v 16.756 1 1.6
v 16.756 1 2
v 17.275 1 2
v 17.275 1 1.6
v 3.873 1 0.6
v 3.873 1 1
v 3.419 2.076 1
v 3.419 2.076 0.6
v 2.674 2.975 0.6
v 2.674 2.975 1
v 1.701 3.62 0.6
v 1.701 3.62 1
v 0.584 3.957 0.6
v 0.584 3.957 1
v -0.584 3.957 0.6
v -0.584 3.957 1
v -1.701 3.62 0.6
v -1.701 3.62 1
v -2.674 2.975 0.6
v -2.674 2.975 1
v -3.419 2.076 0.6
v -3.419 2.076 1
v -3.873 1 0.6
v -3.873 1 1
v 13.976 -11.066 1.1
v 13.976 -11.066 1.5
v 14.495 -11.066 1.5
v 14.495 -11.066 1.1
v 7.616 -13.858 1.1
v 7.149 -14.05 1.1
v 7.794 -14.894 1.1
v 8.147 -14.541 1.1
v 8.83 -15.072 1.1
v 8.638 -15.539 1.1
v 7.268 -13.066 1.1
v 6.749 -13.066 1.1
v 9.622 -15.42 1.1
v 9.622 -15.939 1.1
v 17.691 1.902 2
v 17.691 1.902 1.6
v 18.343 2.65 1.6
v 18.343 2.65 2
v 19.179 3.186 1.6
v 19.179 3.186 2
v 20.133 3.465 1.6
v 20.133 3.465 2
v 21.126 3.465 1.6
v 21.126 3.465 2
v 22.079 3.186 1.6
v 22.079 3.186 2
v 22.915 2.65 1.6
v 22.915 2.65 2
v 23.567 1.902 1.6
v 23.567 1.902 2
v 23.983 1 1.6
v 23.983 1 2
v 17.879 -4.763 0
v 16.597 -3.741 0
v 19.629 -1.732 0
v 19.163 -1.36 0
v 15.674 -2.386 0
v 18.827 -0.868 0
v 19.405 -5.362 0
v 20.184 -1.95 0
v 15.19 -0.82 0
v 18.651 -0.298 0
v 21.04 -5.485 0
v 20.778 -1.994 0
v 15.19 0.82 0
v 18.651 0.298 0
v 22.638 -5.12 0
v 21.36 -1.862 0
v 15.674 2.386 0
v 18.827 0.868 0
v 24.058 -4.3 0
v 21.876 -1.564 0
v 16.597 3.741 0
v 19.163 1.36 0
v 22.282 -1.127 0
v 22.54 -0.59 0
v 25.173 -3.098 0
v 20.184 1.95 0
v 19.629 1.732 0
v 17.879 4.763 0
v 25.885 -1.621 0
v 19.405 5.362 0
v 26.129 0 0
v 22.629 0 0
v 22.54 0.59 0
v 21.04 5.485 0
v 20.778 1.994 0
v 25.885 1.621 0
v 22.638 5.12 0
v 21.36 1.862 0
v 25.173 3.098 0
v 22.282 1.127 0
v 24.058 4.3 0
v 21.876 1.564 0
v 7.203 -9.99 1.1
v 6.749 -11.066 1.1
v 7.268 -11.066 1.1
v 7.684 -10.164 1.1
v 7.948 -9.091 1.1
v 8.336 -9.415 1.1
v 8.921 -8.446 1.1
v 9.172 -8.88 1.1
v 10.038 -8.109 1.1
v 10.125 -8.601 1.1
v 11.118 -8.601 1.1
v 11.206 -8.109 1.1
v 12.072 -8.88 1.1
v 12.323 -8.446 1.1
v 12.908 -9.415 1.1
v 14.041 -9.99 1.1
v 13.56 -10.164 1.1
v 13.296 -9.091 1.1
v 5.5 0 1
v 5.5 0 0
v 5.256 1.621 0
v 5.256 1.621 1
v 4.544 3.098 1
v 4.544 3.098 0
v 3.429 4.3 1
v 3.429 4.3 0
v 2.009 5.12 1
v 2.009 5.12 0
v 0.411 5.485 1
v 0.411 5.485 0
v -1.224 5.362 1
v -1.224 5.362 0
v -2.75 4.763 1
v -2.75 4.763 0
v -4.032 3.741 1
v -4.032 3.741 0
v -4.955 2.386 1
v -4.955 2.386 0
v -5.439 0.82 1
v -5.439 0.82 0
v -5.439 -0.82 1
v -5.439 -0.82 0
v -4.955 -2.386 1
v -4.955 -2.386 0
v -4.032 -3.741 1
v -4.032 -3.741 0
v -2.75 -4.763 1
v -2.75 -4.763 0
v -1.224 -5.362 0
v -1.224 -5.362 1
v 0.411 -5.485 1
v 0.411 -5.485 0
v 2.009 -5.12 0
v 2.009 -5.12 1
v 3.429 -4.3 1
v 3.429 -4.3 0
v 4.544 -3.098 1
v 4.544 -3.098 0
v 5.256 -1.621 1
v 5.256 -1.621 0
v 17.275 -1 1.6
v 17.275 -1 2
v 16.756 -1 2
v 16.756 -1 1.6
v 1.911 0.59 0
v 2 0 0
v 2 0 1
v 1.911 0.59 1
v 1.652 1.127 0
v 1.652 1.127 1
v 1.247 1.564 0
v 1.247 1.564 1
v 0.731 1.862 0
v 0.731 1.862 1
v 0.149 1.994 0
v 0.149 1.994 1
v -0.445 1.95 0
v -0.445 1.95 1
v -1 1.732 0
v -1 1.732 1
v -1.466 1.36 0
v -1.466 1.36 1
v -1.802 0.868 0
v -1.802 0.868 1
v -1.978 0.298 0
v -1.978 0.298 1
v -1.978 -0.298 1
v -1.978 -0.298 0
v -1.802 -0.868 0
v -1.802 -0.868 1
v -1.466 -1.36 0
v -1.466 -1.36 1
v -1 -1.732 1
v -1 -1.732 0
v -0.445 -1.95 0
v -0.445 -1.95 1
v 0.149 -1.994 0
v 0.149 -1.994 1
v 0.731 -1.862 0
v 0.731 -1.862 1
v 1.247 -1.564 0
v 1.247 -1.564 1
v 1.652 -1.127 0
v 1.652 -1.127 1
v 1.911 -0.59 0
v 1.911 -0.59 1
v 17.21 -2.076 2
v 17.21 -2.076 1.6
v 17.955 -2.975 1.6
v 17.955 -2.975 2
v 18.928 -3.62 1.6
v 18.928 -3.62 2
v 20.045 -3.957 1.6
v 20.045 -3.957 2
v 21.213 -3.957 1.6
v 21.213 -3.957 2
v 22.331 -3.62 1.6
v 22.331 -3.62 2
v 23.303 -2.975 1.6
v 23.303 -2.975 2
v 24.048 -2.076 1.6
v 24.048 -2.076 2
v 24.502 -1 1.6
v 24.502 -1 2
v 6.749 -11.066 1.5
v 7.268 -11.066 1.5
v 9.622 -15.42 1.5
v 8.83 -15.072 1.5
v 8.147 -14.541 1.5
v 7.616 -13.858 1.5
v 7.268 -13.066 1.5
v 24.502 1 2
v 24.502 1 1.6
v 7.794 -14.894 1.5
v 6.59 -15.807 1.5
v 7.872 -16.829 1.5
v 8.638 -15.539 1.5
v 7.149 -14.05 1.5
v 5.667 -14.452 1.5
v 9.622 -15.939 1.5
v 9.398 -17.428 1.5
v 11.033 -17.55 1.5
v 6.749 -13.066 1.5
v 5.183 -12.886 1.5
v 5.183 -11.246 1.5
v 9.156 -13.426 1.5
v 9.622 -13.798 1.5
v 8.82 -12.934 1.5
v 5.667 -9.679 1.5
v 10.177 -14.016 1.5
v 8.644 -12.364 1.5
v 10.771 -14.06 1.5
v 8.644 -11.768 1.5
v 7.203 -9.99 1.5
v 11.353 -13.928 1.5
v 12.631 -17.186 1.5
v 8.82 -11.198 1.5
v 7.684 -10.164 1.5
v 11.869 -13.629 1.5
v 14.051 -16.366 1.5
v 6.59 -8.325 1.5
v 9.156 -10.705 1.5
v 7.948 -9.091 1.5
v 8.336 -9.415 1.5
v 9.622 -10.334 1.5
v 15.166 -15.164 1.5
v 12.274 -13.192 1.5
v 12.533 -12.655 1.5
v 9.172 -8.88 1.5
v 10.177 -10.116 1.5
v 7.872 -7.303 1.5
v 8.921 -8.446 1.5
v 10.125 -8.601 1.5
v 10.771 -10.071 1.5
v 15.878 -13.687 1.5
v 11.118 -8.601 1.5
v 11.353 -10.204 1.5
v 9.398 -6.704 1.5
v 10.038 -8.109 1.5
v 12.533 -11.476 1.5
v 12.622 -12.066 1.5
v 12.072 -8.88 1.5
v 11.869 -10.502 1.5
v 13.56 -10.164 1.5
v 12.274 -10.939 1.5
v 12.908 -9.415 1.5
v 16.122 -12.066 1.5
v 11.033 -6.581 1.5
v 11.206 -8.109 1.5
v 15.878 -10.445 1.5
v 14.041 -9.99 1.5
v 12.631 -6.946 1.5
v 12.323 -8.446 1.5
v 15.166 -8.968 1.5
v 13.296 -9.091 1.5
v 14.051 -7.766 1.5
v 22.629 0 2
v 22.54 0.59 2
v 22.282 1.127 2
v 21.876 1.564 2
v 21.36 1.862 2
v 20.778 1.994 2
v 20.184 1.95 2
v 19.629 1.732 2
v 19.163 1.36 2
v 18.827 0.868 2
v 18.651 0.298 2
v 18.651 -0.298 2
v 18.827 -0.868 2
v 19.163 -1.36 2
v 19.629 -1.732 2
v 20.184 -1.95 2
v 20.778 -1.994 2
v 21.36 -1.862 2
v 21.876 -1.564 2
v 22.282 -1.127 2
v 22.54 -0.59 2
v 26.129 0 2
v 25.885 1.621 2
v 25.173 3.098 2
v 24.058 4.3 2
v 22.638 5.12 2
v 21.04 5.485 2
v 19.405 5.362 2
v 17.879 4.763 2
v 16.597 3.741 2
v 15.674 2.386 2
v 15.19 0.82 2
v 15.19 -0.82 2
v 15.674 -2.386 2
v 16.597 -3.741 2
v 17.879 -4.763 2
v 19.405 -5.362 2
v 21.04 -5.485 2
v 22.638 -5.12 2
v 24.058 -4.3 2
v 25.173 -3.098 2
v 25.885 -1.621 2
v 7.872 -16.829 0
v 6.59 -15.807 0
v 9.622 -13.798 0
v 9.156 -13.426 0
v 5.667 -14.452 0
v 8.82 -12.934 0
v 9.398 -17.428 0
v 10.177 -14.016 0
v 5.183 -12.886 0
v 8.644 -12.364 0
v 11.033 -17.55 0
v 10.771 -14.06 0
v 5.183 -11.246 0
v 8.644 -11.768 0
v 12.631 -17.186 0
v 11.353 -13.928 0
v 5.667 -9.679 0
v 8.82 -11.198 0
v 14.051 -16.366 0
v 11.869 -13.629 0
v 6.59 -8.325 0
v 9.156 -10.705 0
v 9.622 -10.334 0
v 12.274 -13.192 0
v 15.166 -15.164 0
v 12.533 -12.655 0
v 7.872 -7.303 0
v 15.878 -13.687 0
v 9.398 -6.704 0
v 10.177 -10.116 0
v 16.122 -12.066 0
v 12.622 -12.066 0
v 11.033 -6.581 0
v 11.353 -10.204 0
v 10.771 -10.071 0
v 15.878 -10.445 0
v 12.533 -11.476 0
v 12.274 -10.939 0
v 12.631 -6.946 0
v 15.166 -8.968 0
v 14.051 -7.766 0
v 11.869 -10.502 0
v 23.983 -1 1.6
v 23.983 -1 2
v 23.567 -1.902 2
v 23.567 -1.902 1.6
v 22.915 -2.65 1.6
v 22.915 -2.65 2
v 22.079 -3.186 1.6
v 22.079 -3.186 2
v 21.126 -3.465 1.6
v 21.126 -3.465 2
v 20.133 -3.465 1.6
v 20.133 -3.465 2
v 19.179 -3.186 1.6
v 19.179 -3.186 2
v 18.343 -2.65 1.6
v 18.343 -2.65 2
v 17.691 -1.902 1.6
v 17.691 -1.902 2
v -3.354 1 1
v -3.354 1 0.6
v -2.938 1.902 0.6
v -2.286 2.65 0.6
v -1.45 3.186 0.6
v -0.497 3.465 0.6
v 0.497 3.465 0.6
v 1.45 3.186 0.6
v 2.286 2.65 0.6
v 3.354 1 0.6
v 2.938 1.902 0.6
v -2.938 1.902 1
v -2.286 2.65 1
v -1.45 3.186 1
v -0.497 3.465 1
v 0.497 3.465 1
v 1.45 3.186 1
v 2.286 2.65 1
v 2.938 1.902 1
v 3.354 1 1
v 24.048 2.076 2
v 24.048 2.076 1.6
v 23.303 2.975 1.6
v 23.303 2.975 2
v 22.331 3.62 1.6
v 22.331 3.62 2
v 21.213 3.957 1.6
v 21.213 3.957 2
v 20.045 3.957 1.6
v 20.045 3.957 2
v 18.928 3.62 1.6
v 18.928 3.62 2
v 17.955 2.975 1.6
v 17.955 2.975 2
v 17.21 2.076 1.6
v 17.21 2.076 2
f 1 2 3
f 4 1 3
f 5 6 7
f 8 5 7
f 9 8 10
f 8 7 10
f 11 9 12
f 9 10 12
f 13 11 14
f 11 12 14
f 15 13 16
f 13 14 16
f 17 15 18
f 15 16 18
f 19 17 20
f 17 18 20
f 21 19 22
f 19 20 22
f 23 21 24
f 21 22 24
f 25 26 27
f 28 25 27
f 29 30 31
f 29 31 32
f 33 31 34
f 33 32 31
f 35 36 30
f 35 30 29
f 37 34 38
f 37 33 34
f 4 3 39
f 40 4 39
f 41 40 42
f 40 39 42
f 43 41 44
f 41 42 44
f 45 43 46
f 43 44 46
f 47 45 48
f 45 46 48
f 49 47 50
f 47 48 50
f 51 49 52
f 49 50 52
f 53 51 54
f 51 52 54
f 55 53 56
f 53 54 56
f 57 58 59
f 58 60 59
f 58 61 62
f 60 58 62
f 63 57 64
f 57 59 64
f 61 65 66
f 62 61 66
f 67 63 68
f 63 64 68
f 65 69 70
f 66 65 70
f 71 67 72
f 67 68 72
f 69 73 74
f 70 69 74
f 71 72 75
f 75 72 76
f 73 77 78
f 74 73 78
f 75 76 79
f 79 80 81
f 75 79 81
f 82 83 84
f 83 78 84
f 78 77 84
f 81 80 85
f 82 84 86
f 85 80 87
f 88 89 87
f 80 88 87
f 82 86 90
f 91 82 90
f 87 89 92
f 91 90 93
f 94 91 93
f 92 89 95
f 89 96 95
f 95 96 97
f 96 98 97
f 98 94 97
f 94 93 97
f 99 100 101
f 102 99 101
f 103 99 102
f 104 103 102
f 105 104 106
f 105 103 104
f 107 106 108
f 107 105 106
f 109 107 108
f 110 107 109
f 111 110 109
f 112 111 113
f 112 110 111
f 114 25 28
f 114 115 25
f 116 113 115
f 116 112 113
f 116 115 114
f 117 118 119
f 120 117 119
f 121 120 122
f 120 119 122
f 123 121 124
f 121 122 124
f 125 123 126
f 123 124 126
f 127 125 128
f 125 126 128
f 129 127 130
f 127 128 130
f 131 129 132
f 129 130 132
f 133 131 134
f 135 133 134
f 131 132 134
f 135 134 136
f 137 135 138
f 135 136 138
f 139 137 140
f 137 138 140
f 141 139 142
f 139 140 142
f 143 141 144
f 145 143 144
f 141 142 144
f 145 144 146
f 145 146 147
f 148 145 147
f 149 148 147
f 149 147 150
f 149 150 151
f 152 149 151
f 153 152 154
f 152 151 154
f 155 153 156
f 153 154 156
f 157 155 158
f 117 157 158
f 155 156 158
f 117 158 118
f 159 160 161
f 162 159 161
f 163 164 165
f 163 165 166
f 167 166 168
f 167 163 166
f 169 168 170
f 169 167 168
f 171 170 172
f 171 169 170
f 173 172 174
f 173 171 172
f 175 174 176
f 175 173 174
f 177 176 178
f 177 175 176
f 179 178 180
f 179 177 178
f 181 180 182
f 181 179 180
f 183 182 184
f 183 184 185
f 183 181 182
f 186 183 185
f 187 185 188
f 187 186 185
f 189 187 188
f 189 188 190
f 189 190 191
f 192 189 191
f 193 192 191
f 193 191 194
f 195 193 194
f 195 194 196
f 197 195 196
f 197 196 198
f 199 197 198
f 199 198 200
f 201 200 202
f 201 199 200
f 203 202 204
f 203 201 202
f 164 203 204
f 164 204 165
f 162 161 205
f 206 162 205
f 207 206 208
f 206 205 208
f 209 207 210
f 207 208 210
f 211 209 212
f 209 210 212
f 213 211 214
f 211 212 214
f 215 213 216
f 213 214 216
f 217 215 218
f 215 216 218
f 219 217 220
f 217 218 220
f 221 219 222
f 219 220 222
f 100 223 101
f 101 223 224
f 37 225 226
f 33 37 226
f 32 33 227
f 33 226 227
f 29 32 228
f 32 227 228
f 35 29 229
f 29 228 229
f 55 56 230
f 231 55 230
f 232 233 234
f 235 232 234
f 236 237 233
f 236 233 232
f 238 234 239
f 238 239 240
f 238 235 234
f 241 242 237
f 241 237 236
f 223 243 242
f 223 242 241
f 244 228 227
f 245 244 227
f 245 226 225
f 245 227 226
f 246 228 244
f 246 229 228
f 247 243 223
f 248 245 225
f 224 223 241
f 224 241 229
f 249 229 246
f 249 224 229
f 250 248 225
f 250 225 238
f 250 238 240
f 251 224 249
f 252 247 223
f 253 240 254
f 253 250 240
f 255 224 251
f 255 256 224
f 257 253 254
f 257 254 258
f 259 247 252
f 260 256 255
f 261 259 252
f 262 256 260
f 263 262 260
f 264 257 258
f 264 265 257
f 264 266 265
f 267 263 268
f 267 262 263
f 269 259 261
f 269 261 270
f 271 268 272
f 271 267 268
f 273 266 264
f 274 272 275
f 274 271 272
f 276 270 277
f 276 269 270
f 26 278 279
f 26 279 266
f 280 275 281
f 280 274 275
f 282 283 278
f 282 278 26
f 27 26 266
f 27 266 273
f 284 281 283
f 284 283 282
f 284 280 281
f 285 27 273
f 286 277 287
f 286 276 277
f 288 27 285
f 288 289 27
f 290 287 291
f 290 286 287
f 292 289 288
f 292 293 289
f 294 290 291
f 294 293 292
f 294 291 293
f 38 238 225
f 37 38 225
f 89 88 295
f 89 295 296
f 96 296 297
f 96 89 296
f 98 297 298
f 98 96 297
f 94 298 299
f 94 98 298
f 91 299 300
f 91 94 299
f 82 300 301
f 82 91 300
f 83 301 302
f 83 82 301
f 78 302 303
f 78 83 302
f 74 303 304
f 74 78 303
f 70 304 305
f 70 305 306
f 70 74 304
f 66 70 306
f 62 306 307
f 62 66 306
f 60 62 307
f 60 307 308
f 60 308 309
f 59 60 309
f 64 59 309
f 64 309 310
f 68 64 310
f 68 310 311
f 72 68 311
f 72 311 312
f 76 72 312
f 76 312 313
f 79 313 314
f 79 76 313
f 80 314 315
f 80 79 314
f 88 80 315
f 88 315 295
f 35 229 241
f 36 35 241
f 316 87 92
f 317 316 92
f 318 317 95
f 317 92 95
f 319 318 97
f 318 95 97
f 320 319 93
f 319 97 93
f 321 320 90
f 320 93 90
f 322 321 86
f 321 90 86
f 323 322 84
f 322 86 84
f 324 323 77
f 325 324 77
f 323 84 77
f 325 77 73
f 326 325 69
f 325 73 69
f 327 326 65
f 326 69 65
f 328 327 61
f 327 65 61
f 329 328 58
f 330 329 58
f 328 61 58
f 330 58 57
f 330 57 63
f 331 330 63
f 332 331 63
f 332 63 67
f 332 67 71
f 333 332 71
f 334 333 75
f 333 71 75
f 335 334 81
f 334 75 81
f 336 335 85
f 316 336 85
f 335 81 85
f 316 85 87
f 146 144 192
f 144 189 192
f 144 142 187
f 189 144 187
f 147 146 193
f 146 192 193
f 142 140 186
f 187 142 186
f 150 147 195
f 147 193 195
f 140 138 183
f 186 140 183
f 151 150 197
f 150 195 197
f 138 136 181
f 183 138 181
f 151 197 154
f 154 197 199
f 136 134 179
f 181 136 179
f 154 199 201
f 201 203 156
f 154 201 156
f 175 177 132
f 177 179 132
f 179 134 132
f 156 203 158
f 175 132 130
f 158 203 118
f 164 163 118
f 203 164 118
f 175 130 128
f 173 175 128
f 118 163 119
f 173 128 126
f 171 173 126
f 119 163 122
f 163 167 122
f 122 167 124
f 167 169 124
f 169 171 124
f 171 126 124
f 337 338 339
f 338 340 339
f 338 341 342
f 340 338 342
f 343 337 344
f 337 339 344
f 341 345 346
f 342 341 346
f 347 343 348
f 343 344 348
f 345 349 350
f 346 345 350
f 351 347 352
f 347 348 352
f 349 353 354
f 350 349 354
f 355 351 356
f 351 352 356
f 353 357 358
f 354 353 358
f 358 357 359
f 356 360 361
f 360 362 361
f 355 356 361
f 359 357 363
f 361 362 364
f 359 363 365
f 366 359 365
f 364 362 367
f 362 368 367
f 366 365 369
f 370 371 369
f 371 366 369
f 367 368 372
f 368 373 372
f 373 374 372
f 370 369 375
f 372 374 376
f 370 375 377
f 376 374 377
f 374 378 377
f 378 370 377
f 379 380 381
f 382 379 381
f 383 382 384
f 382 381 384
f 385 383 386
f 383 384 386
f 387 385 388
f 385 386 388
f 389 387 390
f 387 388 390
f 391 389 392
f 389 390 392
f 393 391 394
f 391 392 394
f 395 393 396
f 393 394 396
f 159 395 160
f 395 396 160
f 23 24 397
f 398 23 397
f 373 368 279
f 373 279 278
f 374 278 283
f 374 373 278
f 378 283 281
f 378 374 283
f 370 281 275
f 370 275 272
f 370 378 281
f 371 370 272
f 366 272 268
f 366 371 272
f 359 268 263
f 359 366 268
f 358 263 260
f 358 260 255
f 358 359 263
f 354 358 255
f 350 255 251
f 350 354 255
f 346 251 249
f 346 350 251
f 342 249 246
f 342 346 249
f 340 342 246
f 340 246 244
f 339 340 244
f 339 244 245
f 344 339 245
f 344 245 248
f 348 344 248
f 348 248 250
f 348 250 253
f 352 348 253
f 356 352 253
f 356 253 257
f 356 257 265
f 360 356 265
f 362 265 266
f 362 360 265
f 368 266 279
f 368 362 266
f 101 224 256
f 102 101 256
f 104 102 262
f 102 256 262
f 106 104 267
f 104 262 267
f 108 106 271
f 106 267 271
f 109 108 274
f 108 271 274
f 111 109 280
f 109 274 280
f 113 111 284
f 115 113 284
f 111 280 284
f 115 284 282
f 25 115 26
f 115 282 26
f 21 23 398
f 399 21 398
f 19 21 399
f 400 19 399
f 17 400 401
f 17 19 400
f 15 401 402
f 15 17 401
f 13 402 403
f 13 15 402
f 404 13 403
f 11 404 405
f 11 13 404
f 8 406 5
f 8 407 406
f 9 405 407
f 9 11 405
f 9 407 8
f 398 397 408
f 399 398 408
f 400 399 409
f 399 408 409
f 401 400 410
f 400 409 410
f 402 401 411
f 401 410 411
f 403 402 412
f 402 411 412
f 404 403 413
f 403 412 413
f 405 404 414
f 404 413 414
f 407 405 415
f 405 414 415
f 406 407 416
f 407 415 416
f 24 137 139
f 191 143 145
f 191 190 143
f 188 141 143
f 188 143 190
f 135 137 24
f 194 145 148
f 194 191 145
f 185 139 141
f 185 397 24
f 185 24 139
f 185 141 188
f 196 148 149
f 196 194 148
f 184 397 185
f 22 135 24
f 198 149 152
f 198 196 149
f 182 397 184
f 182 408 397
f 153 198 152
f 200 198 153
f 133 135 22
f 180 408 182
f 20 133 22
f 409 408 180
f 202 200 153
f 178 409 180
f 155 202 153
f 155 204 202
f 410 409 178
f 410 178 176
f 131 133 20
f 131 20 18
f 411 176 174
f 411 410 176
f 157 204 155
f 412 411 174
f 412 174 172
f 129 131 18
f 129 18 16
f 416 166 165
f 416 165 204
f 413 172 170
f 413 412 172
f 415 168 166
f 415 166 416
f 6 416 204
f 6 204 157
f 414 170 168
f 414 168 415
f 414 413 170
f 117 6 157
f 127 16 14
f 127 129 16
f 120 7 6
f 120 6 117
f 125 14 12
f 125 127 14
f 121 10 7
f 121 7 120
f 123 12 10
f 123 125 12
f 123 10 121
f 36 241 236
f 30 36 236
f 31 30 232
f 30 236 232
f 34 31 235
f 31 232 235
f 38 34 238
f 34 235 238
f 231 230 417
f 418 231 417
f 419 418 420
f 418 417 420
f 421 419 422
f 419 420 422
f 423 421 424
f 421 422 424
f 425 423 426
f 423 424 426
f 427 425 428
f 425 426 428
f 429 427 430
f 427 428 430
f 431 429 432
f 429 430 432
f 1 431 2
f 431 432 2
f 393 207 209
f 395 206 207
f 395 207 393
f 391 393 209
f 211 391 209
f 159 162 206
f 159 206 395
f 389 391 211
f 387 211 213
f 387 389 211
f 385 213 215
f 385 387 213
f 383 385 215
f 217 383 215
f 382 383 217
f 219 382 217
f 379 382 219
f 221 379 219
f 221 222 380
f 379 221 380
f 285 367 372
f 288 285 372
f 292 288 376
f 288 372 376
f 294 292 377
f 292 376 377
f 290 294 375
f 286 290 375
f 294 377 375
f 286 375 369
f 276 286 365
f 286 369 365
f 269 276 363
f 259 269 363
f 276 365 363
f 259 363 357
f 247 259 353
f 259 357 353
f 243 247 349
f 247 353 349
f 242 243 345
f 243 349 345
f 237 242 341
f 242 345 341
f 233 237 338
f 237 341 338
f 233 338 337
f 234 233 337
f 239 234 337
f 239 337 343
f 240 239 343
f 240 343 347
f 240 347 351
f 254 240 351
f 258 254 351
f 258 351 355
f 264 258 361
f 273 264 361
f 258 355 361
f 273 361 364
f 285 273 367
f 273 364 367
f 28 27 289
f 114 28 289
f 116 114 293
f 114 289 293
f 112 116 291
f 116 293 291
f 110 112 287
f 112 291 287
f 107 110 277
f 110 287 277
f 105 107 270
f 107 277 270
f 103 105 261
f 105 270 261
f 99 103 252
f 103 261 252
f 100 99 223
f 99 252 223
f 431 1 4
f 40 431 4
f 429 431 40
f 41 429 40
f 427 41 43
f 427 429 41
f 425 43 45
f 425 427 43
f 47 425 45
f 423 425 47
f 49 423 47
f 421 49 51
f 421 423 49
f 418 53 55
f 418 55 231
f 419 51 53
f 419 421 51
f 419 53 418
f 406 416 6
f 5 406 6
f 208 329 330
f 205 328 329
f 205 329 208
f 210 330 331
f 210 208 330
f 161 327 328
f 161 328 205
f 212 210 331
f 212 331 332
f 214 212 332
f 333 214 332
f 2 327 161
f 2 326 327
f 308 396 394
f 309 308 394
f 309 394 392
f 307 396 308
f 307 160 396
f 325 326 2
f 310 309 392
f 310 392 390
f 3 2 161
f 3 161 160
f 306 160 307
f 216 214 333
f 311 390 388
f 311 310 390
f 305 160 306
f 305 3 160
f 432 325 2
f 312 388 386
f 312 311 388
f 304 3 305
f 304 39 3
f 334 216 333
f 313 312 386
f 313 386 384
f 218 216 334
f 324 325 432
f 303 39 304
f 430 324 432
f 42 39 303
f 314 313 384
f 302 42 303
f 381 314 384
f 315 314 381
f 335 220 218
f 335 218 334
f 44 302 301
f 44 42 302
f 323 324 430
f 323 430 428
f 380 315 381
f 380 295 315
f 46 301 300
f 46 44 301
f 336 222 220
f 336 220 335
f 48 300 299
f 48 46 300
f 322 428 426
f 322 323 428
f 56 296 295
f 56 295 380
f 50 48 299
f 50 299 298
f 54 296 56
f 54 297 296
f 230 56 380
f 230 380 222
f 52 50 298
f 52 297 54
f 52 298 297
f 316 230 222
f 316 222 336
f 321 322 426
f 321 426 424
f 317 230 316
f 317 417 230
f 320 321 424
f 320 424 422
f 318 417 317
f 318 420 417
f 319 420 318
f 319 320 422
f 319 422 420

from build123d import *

# Parameters (mm, degrees)
F0_R      = 5.5
F0_R_2    = 2
F1_DEPTH  = 1
F3_DEPTH  = 0.4
F4_R      = 5.5
F4_R_2    = 2
F5_DEPTH  = 2
F7_DEPTH  = 0.4
F8_R      = 5.5
F8_R_2    = 2
F9_DEPTH  = 1.5
F11_DEPTH = 0.4


with BuildPart() as f1:
    # F0 (on Top) → F1 (new body)
    with BuildSketch(Plane.XY):
        Circle(F0_R)
        Circle(F0_R_2, mode=Mode.SUBTRACT)
    extrude(amount=F1_DEPTH)

    # F2 (on face) → F3 (cut)
    with BuildSketch(Plane.XY.offset(1)):
        with BuildLine():
            Line((3.3541019662, 1), (3.8729833462, 1))
            ThreePointArc((3.8729833462, 1), (0, 4), (-3.8729833462, 1))
            Line((-3.8729833462, 1), (-3.3541019662, 1))
            ThreePointArc((-3.3541019662, 1), (0, 3.5), (3.3541019662, 1))
        make_face()
    extrude(amount=-F3_DEPTH, mode=Mode.SUBTRACT)


with BuildPart() as f5:
    # F4 (on Top) → F5 (new body)
    with BuildSketch(Plane.XY):
        with Locations((20.6290315837, 0)):
            Circle(F4_R)
        with Locations((20.6290315837, 0)):
            Circle(F4_R_2, mode=Mode.SUBTRACT)
    extrude(amount=F5_DEPTH)

    # F6 (on face) → F7 (cut)
    with BuildSketch(Plane.XY.offset(2)):
        with BuildLine():
            ThreePointArc((17.2749296174, 1), (20.6290315837, 3.5), (23.9831335499, 1))
            Line((23.9831335499, 1), (24.5020149299, 1))
            ThreePointArc((24.5020149299, 1), (20.6290315837, 4), (16.7560482375, 1))
            Line((16.7560482375, 1), (17.2749296174, 1))
        make_face()
        with BuildLine():
            Line((24.5020149299, -1), (23.9831335499, -1))
            ThreePointArc((23.9831335499, -1), (20.6290315837, -3.5), (17.2749296174, -1))
            Line((17.2749296174, -1), (16.7560482375, -1))
            ThreePointArc((16.7560482375, -1), (20.6290315837, -4), (24.5020149299, -1))
        make_face()
    extrude(amount=-F7_DEPTH, mode=Mode.SUBTRACT)


with BuildPart() as f9:
    # F8 (on Top) → F9 (new body)
    with BuildSketch(Plane.XY):
        with Locations((10.6219938025, -12.065812014)):
            Circle(F8_R)
        with Locations((10.6219938025, -12.065812014)):
            Circle(F8_R_2, mode=Mode.SUBTRACT)
    extrude(amount=F9_DEPTH)

    # F10 (on face) → F11 (cut)
    with BuildSketch(Plane.XY.offset(1.5)):
        with BuildLine():
            Line((13.9760957687, -11.065812014), (14.4949771487, -11.065812014))
            ThreePointArc((14.4949771487, -11.065812014), (10.6219938025, -8.065812014), (6.7490104563, -11.065812014))
            Line((6.7490104563, -11.065812014), (7.2678918362, -11.065812014))
            ThreePointArc((7.2678918362, -11.065812014), (10.6219938025, -8.565812014), (13.9760957687, -11.065812014))
        make_face()
        with BuildLine():
            ThreePointArc((6.7490104563, -13.065812014), (7.7935666777, -14.8942391388), (9.6219938025, -15.9387953603))
            Line((9.6219938025, -15.9387953603), (9.6219938025, -15.4199139803))
            ThreePointArc((9.6219938025, -15.4199139803), (8.1471200683, -14.5406857482), (7.2678918362, -13.065812014))
            Line((7.2678918362, -13.065812014), (6.7490104563, -13.065812014))
        make_face()
    extrude(amount=-F11_DEPTH, mode=Mode.SUBTRACT)


solid = Compound([f1.part, f5.part, f9.part])
